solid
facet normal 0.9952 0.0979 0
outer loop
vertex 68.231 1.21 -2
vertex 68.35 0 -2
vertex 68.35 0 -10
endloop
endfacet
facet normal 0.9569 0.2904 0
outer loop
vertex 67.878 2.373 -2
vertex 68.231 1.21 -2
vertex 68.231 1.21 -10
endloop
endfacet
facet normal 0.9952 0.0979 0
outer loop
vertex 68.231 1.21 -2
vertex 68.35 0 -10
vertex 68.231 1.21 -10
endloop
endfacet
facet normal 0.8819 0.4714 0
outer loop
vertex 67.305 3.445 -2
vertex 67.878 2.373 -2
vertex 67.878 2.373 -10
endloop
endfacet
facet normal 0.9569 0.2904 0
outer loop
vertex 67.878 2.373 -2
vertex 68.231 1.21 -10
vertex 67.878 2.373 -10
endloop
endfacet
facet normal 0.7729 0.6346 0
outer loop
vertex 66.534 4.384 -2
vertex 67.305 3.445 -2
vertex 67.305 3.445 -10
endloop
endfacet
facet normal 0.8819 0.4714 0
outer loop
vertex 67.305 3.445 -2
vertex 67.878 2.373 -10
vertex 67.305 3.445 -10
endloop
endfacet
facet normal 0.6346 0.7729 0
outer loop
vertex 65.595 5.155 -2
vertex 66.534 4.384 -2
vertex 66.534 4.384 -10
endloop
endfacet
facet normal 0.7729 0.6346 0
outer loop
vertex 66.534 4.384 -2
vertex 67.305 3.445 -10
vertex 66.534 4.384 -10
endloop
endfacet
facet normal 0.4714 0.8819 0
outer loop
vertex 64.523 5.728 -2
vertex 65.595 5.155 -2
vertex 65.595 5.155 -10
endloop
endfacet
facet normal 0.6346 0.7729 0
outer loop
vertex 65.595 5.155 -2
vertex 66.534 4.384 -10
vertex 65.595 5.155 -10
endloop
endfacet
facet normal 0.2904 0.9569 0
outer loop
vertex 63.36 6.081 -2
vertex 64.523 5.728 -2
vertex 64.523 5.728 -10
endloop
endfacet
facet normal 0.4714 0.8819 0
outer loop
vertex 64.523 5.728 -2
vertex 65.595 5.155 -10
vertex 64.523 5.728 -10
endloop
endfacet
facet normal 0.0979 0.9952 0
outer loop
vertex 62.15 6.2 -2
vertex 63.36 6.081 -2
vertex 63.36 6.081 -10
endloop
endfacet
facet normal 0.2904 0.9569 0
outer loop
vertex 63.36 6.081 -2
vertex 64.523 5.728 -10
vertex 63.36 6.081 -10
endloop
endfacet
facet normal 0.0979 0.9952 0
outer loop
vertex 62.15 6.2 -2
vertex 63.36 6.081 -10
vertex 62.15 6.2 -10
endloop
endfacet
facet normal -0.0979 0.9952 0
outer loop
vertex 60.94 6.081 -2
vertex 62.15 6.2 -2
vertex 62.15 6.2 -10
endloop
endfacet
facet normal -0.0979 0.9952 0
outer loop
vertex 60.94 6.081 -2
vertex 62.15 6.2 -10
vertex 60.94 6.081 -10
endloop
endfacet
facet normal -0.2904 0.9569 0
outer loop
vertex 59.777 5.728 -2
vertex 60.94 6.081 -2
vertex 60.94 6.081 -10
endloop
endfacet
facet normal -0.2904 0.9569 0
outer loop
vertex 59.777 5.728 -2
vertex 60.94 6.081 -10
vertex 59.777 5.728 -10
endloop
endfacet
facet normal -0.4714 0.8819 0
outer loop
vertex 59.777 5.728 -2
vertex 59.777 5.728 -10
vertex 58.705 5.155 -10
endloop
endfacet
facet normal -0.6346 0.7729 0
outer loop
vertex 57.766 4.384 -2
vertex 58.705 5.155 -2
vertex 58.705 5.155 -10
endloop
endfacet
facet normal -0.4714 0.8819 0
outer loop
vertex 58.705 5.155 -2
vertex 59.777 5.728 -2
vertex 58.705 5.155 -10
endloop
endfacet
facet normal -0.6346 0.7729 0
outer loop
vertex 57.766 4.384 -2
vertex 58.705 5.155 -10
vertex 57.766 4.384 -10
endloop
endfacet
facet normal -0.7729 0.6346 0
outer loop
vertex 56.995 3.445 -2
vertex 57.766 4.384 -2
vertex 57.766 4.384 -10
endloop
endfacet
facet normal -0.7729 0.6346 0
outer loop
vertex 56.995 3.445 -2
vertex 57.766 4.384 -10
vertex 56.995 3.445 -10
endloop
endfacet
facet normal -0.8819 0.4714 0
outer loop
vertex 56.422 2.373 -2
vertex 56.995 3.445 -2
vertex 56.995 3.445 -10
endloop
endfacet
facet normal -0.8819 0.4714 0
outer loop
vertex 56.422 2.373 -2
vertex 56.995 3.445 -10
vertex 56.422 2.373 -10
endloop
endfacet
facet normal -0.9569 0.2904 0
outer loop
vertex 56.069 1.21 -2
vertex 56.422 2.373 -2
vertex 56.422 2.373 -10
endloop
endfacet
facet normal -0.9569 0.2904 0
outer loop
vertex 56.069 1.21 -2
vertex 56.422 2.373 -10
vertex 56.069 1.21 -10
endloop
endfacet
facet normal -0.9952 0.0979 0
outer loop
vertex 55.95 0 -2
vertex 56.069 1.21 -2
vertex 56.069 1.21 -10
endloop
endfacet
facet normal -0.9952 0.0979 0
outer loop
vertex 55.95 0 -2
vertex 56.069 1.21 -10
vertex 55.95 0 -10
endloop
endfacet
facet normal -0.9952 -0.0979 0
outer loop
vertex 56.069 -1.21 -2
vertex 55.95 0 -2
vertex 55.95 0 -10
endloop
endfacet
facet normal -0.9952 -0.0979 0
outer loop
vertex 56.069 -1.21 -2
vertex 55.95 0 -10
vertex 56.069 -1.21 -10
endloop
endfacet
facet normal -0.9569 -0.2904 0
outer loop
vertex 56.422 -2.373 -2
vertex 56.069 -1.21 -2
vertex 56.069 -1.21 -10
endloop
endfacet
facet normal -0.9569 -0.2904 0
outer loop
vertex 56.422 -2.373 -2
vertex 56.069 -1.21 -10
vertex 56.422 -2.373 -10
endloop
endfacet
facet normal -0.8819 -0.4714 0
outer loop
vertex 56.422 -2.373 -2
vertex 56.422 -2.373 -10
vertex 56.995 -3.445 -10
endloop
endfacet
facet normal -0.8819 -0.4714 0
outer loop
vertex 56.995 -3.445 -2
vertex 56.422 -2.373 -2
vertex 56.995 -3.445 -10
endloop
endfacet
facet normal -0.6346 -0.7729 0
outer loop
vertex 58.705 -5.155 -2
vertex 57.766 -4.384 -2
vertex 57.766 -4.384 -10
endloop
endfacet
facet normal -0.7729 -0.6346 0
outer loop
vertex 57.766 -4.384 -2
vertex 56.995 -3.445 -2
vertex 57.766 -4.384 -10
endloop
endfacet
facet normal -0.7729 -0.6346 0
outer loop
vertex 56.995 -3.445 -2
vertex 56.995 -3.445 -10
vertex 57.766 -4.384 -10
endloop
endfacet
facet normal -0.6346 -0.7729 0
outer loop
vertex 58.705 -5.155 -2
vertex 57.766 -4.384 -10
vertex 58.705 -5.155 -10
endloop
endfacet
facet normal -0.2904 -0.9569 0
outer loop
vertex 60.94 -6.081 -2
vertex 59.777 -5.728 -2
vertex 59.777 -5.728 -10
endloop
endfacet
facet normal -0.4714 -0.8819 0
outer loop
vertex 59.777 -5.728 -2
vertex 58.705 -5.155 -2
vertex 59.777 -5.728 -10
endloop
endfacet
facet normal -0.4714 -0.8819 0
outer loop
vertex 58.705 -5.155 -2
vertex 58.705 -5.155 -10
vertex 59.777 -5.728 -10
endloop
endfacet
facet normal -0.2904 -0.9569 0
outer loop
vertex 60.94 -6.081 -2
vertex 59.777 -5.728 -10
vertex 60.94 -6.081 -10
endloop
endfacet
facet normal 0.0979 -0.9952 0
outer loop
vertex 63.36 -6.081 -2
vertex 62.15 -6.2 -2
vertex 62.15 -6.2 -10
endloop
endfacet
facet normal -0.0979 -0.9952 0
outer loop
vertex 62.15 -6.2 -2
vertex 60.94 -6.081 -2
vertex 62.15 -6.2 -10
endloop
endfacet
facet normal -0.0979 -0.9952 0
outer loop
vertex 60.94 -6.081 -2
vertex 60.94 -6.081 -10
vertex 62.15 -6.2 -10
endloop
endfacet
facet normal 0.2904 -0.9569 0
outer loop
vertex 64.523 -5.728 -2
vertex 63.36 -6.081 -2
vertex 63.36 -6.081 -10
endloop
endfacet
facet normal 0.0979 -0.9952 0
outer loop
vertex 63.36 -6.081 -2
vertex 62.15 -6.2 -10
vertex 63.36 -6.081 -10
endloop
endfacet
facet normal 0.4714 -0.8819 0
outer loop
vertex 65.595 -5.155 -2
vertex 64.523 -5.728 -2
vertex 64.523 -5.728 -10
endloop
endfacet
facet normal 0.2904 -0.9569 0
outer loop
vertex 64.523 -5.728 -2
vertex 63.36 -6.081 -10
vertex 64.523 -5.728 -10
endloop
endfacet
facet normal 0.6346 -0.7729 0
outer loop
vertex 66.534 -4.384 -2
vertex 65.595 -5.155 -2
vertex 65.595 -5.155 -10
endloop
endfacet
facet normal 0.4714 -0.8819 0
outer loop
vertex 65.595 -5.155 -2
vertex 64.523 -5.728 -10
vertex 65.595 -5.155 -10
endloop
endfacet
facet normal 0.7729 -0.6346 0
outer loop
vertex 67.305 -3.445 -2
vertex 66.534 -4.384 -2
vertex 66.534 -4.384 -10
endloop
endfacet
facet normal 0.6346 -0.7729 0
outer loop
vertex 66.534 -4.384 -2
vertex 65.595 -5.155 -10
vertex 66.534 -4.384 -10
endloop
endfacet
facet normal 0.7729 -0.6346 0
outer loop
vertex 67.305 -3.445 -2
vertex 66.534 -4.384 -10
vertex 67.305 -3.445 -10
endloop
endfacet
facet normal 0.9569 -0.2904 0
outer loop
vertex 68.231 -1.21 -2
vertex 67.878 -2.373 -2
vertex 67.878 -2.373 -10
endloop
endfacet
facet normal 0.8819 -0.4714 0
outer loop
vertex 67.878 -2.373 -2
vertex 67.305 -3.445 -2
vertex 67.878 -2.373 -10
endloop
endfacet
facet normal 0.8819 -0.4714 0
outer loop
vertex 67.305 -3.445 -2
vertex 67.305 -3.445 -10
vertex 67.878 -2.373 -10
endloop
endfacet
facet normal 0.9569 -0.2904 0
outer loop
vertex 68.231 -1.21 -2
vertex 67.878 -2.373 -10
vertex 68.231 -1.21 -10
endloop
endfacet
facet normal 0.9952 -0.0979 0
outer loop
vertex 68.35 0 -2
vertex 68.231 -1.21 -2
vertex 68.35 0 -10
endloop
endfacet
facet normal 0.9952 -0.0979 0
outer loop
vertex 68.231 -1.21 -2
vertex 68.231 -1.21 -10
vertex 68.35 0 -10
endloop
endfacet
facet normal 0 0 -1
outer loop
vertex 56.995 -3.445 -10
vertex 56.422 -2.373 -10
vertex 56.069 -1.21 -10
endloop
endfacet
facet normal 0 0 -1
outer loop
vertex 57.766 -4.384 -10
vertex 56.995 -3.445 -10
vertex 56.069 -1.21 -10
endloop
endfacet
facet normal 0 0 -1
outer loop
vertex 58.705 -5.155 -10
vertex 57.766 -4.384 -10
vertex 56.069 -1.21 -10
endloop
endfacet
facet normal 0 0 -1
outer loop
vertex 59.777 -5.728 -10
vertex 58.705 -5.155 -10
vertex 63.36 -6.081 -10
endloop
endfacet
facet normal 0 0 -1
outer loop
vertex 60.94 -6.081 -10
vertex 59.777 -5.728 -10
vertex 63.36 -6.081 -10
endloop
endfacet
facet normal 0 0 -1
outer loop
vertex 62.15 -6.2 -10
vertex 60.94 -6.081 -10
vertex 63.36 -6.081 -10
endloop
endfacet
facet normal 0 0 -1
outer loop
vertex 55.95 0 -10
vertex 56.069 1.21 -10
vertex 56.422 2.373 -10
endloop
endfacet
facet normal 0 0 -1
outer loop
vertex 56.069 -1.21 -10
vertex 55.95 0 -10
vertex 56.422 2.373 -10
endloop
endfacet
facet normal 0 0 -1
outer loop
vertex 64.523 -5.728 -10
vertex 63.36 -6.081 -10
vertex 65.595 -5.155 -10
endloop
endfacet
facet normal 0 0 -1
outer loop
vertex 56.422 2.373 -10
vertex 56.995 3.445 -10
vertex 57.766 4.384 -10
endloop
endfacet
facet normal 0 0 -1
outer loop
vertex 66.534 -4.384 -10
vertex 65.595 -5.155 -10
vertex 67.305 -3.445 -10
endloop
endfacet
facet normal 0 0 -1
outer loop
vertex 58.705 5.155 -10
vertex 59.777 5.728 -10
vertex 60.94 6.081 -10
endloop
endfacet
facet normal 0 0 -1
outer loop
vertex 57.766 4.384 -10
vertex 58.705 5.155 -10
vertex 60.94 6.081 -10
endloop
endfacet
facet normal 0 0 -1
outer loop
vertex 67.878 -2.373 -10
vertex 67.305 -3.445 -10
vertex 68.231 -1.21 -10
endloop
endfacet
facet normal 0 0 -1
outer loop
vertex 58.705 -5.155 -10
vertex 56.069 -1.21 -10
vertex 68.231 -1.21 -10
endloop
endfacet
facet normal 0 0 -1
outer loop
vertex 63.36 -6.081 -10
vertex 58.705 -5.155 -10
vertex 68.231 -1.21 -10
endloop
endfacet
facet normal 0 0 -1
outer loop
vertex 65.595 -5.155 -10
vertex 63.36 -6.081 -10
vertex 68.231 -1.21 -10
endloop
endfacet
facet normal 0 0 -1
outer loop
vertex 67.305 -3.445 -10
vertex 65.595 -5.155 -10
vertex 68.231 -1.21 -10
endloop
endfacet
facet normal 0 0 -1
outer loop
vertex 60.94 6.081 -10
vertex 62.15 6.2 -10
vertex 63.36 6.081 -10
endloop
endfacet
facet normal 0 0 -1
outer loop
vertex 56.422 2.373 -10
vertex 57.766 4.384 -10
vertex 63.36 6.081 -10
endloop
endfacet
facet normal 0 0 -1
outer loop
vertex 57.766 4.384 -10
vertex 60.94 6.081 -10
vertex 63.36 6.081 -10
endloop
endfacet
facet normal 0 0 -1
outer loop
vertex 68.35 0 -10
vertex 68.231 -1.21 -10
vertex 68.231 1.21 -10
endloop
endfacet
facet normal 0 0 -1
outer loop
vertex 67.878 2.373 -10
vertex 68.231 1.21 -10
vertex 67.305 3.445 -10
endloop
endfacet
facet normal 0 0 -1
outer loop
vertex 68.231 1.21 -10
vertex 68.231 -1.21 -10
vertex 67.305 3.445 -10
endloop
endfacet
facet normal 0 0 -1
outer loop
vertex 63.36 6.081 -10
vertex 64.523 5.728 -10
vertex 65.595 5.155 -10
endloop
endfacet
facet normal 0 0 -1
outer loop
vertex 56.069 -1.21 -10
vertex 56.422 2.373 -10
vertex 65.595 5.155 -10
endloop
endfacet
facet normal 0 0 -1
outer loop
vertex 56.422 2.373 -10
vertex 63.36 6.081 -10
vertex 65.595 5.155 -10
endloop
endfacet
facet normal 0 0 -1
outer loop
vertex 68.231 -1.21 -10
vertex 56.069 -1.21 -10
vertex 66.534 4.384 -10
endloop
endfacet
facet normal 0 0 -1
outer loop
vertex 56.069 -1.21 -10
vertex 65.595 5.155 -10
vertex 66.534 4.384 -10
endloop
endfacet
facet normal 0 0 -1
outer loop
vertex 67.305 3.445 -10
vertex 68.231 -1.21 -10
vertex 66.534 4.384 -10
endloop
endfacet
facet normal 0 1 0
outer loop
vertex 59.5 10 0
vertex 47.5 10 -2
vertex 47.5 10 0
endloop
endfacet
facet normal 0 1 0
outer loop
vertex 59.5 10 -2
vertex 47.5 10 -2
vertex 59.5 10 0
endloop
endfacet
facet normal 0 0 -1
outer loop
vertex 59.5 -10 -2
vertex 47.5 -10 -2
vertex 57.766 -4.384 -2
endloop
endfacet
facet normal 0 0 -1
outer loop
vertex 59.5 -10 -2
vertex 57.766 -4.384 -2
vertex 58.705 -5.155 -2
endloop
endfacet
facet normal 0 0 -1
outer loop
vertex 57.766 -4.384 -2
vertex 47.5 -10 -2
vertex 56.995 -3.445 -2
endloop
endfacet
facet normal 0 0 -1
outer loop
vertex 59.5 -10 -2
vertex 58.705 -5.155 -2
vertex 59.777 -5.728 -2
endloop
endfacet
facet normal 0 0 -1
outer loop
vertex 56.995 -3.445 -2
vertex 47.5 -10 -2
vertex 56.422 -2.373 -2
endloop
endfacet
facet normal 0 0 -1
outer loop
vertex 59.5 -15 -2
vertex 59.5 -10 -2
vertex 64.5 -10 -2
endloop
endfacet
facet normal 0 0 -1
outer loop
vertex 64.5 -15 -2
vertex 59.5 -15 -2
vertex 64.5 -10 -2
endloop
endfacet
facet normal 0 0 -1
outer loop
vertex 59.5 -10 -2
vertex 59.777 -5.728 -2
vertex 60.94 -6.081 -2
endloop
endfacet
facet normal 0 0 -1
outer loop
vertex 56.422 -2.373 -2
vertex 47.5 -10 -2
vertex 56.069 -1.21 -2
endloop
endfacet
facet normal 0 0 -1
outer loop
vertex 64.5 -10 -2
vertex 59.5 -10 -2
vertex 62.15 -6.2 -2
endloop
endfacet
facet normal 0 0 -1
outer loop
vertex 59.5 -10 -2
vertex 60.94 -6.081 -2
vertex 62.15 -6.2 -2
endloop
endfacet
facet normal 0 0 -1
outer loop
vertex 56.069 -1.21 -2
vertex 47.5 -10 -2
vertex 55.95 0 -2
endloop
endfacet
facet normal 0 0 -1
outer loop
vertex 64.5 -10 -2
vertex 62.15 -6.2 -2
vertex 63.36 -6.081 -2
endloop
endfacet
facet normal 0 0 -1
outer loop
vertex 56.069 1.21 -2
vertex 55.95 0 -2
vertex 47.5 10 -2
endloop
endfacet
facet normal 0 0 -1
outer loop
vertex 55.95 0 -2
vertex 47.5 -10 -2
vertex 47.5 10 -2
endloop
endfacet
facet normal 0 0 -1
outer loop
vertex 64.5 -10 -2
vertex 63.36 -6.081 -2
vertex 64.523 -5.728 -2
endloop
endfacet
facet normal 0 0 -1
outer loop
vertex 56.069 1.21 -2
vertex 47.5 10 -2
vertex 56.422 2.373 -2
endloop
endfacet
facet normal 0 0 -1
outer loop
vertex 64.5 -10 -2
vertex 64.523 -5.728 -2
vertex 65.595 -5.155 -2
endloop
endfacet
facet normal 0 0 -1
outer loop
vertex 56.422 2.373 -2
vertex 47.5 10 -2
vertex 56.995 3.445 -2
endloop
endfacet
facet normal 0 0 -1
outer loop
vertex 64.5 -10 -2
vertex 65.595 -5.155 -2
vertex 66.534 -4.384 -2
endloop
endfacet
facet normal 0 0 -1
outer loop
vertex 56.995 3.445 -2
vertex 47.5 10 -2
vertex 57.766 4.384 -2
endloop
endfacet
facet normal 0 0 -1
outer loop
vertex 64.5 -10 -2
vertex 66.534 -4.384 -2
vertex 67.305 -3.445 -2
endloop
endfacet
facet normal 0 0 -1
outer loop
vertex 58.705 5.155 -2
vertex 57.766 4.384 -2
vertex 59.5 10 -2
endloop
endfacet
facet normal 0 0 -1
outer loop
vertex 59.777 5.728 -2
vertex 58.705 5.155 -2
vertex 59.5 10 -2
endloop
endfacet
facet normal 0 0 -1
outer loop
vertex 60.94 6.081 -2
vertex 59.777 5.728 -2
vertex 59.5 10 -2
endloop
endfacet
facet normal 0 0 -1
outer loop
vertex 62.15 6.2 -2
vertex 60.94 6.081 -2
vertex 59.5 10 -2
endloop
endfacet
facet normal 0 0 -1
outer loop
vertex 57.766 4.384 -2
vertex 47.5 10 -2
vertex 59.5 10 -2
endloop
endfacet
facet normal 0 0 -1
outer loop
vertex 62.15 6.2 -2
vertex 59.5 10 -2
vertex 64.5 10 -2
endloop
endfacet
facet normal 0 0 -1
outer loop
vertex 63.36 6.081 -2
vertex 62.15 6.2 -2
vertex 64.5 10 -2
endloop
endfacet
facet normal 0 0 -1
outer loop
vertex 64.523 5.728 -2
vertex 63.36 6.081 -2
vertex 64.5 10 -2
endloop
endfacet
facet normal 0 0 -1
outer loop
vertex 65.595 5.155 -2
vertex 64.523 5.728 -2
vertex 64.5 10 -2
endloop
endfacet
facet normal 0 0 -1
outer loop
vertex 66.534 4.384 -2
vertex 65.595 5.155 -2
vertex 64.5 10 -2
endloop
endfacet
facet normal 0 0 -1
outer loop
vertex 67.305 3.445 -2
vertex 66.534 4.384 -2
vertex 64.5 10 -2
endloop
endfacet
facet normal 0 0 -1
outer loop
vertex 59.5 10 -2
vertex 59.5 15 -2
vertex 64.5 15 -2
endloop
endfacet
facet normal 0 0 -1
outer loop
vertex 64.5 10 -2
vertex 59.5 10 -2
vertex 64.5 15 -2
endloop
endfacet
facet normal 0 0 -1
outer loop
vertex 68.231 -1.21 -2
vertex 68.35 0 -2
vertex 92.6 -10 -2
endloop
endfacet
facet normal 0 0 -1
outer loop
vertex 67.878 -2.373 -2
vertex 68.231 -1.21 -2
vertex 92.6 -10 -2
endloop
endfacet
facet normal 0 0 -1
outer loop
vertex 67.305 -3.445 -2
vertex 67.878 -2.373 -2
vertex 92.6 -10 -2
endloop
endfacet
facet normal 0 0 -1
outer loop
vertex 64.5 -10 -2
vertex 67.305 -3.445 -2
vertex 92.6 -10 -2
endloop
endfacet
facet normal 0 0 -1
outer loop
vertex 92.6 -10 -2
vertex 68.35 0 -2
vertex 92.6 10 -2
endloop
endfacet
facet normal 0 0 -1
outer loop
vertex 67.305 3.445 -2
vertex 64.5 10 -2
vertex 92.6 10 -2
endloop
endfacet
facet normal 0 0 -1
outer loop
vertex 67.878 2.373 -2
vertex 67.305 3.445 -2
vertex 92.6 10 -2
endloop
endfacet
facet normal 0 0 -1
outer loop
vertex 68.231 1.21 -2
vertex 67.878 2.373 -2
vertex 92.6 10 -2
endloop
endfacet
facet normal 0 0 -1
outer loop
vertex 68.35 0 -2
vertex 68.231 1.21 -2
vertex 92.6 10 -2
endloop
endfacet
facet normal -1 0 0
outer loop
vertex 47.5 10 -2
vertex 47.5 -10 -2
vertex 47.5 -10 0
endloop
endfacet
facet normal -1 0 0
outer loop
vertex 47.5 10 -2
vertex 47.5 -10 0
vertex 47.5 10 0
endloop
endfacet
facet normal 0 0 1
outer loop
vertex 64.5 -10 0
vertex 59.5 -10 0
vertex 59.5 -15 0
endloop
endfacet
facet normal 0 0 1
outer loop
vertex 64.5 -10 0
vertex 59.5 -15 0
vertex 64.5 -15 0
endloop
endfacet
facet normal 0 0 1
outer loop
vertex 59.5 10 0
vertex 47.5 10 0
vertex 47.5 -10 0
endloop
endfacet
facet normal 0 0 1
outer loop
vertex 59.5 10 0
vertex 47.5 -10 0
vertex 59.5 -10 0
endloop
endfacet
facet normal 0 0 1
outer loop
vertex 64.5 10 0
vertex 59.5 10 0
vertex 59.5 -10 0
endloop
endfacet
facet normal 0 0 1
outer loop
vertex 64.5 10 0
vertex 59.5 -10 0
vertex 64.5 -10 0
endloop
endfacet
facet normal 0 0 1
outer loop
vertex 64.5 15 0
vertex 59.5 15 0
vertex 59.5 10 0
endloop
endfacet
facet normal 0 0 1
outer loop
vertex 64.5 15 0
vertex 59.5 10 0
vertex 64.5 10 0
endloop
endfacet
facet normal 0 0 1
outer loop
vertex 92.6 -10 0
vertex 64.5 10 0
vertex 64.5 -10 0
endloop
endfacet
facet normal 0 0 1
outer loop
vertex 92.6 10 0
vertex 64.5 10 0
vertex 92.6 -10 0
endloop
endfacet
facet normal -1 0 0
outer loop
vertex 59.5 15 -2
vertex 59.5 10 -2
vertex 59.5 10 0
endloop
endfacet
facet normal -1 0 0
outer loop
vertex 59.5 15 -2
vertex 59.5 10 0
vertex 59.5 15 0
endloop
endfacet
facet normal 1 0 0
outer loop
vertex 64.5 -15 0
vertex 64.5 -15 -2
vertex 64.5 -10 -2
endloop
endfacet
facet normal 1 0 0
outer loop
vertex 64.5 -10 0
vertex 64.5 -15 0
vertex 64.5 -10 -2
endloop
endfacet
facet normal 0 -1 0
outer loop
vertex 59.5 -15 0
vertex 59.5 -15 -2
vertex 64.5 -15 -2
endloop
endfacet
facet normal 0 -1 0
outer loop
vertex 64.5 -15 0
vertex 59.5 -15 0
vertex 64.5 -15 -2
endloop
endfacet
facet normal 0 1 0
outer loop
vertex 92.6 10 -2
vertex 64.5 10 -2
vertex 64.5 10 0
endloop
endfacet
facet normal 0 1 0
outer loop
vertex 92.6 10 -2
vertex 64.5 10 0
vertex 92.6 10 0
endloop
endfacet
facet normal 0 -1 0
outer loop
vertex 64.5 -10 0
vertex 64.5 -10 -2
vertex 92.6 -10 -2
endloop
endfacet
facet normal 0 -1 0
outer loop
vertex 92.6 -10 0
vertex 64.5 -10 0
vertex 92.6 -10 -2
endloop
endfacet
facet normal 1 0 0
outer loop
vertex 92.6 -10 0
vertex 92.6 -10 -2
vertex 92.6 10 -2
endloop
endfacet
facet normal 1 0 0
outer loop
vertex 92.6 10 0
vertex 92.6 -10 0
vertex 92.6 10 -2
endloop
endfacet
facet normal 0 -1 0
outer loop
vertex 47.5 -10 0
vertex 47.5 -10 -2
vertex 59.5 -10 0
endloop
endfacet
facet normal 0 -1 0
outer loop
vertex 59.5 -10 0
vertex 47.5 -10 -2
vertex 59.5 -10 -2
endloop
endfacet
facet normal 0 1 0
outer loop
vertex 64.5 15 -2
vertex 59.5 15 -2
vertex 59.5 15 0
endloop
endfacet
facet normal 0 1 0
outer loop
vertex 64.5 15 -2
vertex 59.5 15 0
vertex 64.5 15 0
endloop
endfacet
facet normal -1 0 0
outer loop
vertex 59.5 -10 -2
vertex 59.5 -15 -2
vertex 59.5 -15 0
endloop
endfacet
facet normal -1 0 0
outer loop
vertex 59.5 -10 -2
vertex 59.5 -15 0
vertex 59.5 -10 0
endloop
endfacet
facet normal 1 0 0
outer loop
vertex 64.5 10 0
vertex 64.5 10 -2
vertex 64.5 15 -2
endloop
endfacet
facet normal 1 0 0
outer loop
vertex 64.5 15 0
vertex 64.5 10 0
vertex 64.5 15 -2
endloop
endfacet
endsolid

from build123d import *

# Parameters (mm, degrees)
CYLINDER003_R     = 6.2
CYLINDER003_DEPTH = 10
BOX006_W          = 45.1
BOX006_H          = 20
BOX006_DEPTH      = 2
BOX005_W          = 5
BOX005_H          = 5
BOX005_DEPTH      = 2
BOX004_W          = 5
BOX004_H          = 5
BOX004_DEPTH      = 2


with BuildPart() as cylinder:
    # Cylinder003 → Cylinder003 (new body)
    with BuildSketch(Plane(origin=(62.15, 0, -10), x_dir=(1, 0, 0), z_dir=(0, 0, 1))):
        Circle(CYLINDER003_R)
    extrude(amount=CYLINDER003_DEPTH)


with BuildPart() as cube003:
    # Box006 → Box006 (new body)
    with BuildSketch(Plane(origin=(47.5, -10, -2), x_dir=(1, 0, 0), z_dir=(0, 0, 1))):
        with Locations((22.55, 10)):
            Rectangle(BOX006_W, BOX006_H)
    extrude(amount=BOX006_DEPTH)


with BuildPart() as cube002:
    # Box005 → Box005 (new body)
    with BuildSketch(Plane(origin=(59.5, 10, -2), x_dir=(1, 0, 0), z_dir=(0, 0, 1))):
        with Locations((2.5, 2.5)):
            Rectangle(BOX005_W, BOX005_H)
    extrude(amount=BOX005_DEPTH)


with BuildPart() as corta_cilindo_solo:
    # Box004 → Box004 (new body)
    with BuildSketch(Plane(origin=(59.5, -15, -2), x_dir=(1, 0, 0), z_dir=(0, 0, 1))):
        with Locations((2.5, 2.5)):
            Rectangle(BOX004_W, BOX004_H)
    extrude(amount=BOX004_DEPTH)

    # Fusion004: union Cube002
    add(cube002.part)

    # Fusion005: union Cube003
    add(cube003.part)

    # Fusion006: union Cylinder
    add(cylinder.part)


solid = corta_cilindo_solo.part
